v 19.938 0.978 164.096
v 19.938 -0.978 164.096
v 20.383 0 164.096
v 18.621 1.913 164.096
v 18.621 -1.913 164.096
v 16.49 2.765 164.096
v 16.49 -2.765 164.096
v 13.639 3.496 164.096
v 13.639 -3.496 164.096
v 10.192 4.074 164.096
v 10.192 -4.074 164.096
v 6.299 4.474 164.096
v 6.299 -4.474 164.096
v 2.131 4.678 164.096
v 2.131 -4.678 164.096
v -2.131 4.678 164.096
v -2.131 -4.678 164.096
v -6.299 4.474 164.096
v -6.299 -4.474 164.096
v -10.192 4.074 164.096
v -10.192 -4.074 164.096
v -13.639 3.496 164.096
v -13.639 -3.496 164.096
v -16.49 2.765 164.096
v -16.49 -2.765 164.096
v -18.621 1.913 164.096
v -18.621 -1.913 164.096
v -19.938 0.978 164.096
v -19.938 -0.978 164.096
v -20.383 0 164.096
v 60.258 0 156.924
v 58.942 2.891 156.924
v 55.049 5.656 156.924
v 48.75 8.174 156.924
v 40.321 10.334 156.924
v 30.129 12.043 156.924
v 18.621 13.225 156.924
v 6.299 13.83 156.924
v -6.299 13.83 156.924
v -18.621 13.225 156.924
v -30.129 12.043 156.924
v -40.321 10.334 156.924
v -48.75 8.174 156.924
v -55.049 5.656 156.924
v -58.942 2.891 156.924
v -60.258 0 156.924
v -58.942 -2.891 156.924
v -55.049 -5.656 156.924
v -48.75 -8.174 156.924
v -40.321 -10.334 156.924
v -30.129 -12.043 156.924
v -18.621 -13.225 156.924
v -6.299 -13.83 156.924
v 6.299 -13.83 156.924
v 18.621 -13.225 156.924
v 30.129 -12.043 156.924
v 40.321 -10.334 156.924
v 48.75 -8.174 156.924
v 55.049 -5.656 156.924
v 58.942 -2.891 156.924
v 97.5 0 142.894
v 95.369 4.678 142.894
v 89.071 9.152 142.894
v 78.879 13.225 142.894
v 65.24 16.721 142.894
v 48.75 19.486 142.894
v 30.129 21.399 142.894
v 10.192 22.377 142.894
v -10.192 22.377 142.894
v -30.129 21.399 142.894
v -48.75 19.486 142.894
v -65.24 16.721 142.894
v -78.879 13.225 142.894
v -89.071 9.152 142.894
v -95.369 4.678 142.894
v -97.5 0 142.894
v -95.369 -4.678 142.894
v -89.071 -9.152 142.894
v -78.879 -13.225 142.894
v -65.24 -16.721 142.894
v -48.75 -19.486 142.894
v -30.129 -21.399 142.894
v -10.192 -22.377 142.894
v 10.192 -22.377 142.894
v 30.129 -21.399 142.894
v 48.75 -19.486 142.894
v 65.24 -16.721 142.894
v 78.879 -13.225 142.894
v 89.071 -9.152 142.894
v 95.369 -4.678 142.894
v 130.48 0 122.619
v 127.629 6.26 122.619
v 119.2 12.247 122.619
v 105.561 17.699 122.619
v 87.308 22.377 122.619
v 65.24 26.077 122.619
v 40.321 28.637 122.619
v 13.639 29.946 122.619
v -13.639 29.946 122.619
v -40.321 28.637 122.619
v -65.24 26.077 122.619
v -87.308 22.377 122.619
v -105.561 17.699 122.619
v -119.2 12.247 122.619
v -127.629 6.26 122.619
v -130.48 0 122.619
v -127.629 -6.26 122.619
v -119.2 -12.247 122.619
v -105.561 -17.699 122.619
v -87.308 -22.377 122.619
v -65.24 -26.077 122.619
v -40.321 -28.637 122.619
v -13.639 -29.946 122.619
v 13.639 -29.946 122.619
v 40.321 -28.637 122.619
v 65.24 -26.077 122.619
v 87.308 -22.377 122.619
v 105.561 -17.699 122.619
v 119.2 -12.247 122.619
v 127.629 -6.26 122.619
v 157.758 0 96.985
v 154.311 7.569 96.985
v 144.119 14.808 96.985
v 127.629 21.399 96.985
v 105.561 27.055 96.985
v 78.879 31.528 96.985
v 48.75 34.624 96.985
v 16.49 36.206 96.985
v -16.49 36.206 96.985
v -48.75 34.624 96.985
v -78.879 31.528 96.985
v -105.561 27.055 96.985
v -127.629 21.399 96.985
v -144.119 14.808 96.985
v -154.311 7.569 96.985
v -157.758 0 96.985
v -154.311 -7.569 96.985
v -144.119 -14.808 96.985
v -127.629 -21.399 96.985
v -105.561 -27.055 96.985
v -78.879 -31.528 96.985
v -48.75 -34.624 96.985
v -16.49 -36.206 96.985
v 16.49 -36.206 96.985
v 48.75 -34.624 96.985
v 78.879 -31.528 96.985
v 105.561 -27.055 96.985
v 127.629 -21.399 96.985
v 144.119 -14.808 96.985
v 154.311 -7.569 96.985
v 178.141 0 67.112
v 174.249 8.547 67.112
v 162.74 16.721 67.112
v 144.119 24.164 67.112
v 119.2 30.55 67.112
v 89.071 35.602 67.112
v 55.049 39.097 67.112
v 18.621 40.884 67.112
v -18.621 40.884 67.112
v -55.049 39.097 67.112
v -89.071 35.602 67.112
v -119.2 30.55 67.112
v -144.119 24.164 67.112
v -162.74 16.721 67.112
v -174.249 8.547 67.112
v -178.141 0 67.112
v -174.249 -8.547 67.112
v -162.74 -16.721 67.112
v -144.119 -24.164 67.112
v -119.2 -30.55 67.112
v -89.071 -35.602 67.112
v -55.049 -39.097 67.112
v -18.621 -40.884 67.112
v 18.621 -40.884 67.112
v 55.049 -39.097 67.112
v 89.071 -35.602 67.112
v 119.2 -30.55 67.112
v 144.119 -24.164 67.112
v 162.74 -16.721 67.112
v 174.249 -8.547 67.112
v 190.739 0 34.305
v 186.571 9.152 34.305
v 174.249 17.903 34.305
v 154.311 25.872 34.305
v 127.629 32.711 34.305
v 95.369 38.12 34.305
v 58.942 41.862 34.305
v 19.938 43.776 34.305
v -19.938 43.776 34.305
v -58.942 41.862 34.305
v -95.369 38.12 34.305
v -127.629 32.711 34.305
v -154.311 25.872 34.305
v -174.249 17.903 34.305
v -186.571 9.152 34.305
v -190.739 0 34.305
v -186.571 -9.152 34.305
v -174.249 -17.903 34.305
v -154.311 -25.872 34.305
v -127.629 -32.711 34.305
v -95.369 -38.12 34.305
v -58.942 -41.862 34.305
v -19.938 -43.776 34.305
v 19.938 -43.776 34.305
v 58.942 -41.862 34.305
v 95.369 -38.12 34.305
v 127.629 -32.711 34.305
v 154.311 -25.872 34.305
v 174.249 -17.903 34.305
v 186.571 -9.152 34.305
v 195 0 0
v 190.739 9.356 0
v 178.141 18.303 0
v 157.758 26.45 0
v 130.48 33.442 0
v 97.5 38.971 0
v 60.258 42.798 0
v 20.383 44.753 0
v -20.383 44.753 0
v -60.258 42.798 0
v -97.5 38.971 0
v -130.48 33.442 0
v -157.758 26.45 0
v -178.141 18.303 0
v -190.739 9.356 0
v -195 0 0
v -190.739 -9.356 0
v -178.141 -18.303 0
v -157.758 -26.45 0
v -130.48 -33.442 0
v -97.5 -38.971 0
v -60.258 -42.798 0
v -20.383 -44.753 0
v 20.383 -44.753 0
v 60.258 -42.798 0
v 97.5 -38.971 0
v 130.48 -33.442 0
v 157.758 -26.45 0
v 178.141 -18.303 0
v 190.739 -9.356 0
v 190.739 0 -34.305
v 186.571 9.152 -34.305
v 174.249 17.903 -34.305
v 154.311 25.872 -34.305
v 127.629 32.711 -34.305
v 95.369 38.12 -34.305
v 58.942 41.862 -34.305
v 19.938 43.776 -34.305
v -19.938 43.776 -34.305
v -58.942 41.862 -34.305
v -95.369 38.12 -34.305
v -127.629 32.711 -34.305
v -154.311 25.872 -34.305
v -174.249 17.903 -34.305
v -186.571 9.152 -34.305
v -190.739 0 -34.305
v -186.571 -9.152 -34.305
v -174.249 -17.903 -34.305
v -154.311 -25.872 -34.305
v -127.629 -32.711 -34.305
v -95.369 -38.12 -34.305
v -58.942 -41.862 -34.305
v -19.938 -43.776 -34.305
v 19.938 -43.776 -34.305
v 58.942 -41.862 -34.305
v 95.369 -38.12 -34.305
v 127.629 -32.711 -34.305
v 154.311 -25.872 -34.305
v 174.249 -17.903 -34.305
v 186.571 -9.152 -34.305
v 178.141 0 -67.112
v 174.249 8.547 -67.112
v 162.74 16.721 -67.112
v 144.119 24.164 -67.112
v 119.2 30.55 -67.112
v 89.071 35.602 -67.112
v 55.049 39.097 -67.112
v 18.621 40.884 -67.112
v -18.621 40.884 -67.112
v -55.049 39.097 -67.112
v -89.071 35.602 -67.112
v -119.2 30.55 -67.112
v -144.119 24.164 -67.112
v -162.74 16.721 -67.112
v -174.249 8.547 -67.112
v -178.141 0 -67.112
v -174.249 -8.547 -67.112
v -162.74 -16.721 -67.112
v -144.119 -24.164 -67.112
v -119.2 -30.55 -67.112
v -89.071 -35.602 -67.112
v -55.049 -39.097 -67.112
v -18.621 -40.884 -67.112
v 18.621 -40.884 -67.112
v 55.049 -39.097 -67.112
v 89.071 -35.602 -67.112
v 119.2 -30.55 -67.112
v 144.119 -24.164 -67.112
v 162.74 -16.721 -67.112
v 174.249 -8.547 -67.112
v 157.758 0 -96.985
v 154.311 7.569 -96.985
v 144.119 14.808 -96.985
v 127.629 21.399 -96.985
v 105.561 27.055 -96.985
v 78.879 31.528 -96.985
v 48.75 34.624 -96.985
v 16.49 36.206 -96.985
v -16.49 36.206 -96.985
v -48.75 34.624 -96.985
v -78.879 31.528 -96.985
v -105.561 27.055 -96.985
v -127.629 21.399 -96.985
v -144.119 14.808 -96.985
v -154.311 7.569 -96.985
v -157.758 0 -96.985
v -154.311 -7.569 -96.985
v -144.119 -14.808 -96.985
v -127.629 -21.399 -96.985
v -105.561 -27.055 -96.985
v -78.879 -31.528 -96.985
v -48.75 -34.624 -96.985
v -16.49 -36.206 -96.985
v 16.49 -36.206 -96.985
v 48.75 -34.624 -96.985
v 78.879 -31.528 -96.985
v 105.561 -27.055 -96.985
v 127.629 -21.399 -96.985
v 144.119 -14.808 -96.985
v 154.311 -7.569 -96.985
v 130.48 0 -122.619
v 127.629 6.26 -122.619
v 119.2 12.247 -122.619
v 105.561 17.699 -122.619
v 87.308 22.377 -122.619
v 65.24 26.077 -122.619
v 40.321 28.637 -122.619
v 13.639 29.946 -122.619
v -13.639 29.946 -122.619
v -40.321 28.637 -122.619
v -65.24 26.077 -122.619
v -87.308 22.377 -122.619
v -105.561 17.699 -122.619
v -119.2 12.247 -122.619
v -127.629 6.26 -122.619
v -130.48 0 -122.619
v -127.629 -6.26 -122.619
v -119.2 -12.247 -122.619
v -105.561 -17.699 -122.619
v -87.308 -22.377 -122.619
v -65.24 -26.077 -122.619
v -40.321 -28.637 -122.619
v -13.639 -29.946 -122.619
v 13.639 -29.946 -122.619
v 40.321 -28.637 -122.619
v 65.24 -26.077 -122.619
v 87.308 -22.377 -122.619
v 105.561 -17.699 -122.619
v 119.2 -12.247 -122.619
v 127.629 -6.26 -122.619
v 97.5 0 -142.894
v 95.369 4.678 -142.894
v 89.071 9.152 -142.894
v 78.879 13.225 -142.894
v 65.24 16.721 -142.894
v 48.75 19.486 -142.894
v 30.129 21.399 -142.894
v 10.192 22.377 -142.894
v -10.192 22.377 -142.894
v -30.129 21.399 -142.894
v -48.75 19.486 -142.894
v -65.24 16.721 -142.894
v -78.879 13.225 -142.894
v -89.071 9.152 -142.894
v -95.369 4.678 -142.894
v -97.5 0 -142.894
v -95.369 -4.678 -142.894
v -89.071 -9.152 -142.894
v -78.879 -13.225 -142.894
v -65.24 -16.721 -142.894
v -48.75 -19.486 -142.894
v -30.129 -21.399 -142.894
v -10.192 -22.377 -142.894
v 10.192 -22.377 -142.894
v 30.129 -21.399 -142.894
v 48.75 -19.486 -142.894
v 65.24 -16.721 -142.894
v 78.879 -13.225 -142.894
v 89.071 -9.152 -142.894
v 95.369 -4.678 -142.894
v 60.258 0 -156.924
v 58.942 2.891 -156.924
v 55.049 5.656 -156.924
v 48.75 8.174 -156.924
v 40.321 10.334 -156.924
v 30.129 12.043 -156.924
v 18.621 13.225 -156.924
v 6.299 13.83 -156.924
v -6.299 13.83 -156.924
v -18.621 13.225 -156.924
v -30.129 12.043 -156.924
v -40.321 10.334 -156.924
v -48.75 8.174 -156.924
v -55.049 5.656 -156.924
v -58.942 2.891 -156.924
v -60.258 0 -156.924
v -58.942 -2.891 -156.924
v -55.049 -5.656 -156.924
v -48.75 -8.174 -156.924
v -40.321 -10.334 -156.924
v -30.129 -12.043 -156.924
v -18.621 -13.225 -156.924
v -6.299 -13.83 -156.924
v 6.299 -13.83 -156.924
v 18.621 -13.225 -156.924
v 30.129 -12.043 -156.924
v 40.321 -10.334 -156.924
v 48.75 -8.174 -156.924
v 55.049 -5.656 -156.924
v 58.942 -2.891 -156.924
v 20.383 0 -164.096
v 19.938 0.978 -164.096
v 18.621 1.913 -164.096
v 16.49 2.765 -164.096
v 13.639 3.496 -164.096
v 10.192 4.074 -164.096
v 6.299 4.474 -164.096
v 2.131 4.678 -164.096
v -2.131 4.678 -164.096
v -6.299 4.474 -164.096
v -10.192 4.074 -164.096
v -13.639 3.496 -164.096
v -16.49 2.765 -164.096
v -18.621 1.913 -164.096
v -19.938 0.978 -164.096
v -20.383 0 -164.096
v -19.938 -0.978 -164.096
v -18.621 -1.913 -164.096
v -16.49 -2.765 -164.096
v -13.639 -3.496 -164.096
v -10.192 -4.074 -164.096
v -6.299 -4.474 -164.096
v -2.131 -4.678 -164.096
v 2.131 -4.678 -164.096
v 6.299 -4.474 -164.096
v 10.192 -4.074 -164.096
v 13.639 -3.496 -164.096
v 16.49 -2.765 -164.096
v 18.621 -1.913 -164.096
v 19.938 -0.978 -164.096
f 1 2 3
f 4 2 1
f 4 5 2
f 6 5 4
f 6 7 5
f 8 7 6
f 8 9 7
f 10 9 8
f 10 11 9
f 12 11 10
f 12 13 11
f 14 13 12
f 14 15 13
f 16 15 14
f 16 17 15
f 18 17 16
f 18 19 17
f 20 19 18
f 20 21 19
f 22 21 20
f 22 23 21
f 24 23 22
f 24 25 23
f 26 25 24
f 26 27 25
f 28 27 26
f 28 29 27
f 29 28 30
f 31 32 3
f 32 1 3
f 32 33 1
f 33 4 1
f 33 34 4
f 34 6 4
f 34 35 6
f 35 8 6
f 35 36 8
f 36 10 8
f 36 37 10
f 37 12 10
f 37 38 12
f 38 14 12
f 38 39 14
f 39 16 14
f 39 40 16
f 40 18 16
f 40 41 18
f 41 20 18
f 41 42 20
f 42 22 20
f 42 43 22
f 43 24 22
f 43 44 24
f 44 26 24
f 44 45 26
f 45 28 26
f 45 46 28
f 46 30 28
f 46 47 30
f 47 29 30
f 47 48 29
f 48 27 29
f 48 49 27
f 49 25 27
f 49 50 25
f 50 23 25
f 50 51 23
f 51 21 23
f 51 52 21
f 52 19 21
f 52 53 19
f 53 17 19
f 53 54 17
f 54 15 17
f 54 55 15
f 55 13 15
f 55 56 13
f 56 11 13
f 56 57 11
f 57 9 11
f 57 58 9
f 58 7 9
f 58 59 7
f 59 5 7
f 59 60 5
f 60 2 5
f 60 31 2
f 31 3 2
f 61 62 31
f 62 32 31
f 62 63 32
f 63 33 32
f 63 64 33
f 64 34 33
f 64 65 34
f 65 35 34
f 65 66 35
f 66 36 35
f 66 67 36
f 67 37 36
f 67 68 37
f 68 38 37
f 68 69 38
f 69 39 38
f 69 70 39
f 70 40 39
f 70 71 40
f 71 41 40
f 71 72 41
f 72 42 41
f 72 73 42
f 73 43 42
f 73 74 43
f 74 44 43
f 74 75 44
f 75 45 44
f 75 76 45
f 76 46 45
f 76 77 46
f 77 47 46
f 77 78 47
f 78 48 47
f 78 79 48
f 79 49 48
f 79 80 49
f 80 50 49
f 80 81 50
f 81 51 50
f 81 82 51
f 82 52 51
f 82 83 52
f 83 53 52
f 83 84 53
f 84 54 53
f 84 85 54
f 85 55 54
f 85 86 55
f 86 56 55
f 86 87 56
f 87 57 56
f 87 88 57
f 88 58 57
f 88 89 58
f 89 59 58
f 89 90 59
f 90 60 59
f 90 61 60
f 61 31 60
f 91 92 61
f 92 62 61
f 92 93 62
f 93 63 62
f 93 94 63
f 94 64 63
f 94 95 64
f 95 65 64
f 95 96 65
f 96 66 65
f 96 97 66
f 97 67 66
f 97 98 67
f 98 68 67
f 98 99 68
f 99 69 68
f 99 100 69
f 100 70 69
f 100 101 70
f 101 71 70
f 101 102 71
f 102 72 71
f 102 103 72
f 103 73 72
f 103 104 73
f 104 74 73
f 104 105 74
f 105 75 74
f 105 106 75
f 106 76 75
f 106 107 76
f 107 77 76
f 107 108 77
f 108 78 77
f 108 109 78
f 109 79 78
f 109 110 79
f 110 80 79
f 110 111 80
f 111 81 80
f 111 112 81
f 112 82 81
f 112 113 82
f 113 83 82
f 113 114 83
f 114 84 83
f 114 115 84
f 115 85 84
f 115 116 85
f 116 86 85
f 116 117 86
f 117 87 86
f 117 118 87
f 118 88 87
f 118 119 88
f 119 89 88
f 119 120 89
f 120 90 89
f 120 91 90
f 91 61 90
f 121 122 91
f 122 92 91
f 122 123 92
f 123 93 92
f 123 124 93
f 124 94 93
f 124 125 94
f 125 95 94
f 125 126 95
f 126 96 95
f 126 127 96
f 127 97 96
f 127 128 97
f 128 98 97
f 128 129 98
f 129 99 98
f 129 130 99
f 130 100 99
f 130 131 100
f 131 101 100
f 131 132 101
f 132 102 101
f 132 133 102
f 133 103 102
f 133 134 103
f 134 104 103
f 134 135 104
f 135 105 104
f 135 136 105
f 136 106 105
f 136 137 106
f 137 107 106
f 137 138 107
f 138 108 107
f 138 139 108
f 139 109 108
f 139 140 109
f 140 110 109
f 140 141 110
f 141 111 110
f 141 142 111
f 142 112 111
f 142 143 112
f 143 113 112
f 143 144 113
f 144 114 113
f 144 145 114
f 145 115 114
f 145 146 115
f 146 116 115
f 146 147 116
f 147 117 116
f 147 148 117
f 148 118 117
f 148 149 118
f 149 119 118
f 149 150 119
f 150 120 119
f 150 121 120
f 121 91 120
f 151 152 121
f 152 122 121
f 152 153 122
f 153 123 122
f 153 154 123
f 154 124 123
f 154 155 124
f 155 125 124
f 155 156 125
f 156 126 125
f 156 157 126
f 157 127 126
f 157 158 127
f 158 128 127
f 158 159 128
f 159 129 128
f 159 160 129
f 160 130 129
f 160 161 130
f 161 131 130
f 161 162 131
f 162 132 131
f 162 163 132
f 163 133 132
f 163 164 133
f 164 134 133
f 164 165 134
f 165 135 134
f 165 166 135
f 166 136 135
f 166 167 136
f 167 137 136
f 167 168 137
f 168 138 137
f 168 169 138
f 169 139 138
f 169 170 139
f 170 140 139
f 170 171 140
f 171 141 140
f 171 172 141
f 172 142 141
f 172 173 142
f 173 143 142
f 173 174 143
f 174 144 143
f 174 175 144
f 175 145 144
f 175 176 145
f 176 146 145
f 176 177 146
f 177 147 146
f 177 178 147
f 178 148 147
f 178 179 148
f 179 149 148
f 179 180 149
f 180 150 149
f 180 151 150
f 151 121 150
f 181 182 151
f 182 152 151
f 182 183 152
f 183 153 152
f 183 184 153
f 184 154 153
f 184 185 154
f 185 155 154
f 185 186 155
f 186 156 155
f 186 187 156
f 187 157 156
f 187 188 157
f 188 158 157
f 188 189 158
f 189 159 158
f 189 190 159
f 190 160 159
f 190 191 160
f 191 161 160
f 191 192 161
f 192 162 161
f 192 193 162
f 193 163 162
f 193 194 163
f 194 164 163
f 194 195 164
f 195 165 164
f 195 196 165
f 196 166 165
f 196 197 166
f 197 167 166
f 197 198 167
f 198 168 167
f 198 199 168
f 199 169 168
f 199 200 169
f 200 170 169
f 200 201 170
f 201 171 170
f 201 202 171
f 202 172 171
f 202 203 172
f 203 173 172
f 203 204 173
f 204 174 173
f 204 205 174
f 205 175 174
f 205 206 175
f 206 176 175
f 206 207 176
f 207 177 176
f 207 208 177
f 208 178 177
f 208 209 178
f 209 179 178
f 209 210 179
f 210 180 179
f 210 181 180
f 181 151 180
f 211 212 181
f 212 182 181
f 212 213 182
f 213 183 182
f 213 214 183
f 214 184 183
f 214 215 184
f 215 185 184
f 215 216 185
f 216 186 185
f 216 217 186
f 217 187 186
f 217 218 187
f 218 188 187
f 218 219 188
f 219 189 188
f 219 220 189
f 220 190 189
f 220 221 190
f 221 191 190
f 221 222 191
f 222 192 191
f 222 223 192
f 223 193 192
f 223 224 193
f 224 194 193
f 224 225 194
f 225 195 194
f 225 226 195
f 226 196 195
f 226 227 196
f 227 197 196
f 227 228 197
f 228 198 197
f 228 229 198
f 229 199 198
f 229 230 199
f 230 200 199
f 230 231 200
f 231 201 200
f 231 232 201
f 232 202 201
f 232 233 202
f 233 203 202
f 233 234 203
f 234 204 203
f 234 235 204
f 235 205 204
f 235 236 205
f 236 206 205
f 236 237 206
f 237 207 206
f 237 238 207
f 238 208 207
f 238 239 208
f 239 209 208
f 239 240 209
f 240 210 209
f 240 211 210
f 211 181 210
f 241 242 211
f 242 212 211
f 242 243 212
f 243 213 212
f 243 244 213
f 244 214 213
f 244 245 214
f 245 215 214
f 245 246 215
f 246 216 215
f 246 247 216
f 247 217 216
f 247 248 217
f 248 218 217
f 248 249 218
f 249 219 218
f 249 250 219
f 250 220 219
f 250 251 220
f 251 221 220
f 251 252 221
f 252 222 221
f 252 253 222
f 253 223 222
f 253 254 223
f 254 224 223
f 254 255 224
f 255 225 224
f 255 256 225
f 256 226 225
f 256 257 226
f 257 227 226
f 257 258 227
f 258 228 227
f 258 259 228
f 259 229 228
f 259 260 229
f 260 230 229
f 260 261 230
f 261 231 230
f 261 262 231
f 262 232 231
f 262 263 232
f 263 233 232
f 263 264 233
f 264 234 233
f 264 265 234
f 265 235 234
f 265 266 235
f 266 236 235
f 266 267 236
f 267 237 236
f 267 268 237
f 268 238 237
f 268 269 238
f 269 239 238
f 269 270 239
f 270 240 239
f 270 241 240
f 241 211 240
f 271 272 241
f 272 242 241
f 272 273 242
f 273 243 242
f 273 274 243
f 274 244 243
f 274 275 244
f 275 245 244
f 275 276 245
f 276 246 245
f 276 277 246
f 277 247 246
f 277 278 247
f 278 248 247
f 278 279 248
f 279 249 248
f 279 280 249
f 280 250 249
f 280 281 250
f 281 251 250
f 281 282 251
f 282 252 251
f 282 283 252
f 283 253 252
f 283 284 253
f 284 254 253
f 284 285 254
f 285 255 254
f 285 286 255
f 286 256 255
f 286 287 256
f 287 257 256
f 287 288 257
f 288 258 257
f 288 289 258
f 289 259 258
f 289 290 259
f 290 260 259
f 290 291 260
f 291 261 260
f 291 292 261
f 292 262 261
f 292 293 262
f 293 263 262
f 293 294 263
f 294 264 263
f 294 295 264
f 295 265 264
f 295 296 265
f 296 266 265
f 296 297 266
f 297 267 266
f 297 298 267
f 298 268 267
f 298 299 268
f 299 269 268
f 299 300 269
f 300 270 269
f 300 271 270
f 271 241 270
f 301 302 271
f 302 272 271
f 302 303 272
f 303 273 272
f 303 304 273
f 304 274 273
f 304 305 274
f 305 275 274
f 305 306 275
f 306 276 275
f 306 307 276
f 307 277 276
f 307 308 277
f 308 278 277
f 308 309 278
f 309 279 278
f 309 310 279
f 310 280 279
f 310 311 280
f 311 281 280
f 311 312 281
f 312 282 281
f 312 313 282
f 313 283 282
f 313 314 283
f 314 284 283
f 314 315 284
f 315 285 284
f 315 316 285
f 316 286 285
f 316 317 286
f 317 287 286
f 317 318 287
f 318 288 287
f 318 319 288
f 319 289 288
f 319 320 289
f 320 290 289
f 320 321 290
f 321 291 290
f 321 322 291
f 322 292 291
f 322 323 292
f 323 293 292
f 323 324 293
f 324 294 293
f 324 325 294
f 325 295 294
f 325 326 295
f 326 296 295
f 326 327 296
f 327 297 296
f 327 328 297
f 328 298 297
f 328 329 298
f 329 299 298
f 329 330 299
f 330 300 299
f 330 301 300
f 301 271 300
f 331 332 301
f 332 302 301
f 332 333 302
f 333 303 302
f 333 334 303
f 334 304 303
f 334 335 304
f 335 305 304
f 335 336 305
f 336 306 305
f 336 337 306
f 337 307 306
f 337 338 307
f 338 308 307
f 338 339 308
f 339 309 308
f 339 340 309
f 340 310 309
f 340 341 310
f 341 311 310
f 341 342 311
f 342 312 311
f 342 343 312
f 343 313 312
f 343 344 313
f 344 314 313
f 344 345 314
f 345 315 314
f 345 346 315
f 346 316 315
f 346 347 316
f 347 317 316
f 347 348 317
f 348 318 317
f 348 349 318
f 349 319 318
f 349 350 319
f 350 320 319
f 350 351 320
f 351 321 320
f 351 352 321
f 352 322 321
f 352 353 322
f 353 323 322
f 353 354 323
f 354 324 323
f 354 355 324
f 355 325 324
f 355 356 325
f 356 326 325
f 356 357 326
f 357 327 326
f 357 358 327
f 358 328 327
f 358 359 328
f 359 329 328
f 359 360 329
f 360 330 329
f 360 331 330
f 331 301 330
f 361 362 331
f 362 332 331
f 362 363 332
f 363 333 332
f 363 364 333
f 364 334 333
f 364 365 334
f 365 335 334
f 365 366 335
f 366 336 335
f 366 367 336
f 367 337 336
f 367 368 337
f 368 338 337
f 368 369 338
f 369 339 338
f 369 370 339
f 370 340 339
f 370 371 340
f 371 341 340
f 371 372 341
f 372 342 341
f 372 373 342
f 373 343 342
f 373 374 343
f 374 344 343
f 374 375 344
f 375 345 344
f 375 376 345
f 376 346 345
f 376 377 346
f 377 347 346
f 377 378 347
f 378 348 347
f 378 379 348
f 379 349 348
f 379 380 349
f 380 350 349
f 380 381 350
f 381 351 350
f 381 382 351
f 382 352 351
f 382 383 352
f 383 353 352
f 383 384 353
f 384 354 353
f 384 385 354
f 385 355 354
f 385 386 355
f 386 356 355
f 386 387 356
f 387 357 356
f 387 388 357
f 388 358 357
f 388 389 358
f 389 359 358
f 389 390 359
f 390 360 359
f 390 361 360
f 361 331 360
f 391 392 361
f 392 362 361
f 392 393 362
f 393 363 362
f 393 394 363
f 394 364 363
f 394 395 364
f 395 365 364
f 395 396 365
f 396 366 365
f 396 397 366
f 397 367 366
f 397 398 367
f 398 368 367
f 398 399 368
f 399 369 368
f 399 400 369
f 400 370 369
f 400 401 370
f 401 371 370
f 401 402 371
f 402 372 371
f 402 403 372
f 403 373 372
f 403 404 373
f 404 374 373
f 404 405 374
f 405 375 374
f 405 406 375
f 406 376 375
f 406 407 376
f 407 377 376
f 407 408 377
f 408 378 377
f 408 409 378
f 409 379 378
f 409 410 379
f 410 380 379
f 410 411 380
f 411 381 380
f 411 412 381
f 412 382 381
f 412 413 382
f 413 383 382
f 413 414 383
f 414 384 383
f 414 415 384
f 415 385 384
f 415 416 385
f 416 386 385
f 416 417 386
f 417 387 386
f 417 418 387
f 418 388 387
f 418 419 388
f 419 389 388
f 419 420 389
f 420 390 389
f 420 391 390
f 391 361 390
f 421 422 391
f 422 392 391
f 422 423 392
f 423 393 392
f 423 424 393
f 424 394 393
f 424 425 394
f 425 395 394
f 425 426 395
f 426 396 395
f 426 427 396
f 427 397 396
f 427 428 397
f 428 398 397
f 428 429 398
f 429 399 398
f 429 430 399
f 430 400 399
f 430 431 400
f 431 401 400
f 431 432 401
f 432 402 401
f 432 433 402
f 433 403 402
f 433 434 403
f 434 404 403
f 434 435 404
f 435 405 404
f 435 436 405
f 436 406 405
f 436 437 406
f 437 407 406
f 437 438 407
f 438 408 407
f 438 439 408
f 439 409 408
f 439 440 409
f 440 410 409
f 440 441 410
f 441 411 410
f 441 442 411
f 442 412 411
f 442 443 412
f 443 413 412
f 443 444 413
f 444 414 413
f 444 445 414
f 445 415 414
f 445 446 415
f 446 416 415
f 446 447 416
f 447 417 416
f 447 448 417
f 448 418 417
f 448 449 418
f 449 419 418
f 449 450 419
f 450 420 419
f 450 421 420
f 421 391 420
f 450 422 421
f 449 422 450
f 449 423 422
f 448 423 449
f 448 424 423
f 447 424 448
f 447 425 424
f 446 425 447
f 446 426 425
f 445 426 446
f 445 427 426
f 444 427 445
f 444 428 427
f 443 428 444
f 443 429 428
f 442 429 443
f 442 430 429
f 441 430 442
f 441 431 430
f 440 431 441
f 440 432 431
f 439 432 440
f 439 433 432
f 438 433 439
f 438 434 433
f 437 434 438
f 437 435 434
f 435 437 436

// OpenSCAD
// Generated by SolidPython 1.0.1 on 2020-07-29 00:46:50


scale(v = [13, 3, 11]) {
	sphere(r = 15);
}
/***********************************************
*********      SolidPython code:      **********
************************************************
 
# import packages: SolidPython
from solid import *
from solid.utils import *
from itertools import chain, combinations, permutations


class Resize:

    def __init__(self, scad_file):
        self.scad_file = scad_file
        #self.scad_file = import_scad(scad_file)
        # cone/cylinder param:
        self.r1 = 0
        self.r2 = 0
        self.h = 0
        # rectangular prism param:
        self.w = 0
        self.l = 0
        # ellipse param:
        self.r = 0

    # import OpenScad code (file name corresponds to shape)


    # classify shape + parameters
    def assign(self, param1, param2, param3):
        if self.scad_file == 'cone.scad':
            self.r1 = param1
            self.r2 = param2
            self.h = param3
        elif self.scad_file == 'cylinder.scad':
            self.r1 = param1
            self.r2 = param2
            self.h = param3
        elif self.scad_file == 'rectangularPrism.scad':
            self.h = param1
            self.l = param2
            self.w = param3
        else:
            self.r = param1
            self.h = param2

    # resize parameters
    def iterate(self):
        x = range(3, 20, 2)
        i = 1
        if self.scad_file == 'cone.scad':
            tempList = list(permutations(x, 2))
            for temp in tempList:
                param1 = temp[0]
                param2 = temp[1]
                filepath = 'produced_scad_files/' + 'cone' + str(param1) + '_' + str(param2) + '_' + '.scad'
                scad_render_to_file(cylinder(h=param1, r1=param2, r2=0), filepath)

        elif self.scad_file == 'cylinder.scad':
            tempList = list(permutations(x, 3))
            for temp in tempList:
                param1 = temp[0]
                param2 = temp[1]
                filepath = 'produced_scad_files/' + 'cylinder' + str(param1) + '_' + str(param2) + '_' + '.scad'
                scad_render_to_file(cylinder(h=param1, r1=param2, r2=param2), filepath)

        elif self.scad_file == 'rectangularPrism.scad':
            tempList = list(permutations(x, 3))
            for temp in tempList:
                param1 = temp[0]
                param2 = temp[1]
                param3 = temp[2]
                filepath = 'produced_scad_files/' + 'rectangularPrism' + str(param1) + '_' + str(param2) + '_' + str(
                    param3) + '.scad'
                scad_render_to_file(cube(size=(param1, param2, param3)), filepath)

        elif self.scad_file == 'ellipse.scad':
            tempList = list(permutations(x, 4))
            for temp in tempList:
                param1 = temp[0]
                param2 = temp[1]
                param3 = temp[2]
                param4 = temp[3]
                filepath = 'produced_scad_files/' + 'ellipse' + str(param1) + '_' + str(param2) + '_' + str(param3) + '_' + str(param4) + '.scad'
                scad_render_to_file(scale([param1, param2, param3])(sphere(r=param4)), filepath)

    def render_to_scadfile(self):
        scad_render_to_file(scad, 'example.scad') 
 
************************************************/
